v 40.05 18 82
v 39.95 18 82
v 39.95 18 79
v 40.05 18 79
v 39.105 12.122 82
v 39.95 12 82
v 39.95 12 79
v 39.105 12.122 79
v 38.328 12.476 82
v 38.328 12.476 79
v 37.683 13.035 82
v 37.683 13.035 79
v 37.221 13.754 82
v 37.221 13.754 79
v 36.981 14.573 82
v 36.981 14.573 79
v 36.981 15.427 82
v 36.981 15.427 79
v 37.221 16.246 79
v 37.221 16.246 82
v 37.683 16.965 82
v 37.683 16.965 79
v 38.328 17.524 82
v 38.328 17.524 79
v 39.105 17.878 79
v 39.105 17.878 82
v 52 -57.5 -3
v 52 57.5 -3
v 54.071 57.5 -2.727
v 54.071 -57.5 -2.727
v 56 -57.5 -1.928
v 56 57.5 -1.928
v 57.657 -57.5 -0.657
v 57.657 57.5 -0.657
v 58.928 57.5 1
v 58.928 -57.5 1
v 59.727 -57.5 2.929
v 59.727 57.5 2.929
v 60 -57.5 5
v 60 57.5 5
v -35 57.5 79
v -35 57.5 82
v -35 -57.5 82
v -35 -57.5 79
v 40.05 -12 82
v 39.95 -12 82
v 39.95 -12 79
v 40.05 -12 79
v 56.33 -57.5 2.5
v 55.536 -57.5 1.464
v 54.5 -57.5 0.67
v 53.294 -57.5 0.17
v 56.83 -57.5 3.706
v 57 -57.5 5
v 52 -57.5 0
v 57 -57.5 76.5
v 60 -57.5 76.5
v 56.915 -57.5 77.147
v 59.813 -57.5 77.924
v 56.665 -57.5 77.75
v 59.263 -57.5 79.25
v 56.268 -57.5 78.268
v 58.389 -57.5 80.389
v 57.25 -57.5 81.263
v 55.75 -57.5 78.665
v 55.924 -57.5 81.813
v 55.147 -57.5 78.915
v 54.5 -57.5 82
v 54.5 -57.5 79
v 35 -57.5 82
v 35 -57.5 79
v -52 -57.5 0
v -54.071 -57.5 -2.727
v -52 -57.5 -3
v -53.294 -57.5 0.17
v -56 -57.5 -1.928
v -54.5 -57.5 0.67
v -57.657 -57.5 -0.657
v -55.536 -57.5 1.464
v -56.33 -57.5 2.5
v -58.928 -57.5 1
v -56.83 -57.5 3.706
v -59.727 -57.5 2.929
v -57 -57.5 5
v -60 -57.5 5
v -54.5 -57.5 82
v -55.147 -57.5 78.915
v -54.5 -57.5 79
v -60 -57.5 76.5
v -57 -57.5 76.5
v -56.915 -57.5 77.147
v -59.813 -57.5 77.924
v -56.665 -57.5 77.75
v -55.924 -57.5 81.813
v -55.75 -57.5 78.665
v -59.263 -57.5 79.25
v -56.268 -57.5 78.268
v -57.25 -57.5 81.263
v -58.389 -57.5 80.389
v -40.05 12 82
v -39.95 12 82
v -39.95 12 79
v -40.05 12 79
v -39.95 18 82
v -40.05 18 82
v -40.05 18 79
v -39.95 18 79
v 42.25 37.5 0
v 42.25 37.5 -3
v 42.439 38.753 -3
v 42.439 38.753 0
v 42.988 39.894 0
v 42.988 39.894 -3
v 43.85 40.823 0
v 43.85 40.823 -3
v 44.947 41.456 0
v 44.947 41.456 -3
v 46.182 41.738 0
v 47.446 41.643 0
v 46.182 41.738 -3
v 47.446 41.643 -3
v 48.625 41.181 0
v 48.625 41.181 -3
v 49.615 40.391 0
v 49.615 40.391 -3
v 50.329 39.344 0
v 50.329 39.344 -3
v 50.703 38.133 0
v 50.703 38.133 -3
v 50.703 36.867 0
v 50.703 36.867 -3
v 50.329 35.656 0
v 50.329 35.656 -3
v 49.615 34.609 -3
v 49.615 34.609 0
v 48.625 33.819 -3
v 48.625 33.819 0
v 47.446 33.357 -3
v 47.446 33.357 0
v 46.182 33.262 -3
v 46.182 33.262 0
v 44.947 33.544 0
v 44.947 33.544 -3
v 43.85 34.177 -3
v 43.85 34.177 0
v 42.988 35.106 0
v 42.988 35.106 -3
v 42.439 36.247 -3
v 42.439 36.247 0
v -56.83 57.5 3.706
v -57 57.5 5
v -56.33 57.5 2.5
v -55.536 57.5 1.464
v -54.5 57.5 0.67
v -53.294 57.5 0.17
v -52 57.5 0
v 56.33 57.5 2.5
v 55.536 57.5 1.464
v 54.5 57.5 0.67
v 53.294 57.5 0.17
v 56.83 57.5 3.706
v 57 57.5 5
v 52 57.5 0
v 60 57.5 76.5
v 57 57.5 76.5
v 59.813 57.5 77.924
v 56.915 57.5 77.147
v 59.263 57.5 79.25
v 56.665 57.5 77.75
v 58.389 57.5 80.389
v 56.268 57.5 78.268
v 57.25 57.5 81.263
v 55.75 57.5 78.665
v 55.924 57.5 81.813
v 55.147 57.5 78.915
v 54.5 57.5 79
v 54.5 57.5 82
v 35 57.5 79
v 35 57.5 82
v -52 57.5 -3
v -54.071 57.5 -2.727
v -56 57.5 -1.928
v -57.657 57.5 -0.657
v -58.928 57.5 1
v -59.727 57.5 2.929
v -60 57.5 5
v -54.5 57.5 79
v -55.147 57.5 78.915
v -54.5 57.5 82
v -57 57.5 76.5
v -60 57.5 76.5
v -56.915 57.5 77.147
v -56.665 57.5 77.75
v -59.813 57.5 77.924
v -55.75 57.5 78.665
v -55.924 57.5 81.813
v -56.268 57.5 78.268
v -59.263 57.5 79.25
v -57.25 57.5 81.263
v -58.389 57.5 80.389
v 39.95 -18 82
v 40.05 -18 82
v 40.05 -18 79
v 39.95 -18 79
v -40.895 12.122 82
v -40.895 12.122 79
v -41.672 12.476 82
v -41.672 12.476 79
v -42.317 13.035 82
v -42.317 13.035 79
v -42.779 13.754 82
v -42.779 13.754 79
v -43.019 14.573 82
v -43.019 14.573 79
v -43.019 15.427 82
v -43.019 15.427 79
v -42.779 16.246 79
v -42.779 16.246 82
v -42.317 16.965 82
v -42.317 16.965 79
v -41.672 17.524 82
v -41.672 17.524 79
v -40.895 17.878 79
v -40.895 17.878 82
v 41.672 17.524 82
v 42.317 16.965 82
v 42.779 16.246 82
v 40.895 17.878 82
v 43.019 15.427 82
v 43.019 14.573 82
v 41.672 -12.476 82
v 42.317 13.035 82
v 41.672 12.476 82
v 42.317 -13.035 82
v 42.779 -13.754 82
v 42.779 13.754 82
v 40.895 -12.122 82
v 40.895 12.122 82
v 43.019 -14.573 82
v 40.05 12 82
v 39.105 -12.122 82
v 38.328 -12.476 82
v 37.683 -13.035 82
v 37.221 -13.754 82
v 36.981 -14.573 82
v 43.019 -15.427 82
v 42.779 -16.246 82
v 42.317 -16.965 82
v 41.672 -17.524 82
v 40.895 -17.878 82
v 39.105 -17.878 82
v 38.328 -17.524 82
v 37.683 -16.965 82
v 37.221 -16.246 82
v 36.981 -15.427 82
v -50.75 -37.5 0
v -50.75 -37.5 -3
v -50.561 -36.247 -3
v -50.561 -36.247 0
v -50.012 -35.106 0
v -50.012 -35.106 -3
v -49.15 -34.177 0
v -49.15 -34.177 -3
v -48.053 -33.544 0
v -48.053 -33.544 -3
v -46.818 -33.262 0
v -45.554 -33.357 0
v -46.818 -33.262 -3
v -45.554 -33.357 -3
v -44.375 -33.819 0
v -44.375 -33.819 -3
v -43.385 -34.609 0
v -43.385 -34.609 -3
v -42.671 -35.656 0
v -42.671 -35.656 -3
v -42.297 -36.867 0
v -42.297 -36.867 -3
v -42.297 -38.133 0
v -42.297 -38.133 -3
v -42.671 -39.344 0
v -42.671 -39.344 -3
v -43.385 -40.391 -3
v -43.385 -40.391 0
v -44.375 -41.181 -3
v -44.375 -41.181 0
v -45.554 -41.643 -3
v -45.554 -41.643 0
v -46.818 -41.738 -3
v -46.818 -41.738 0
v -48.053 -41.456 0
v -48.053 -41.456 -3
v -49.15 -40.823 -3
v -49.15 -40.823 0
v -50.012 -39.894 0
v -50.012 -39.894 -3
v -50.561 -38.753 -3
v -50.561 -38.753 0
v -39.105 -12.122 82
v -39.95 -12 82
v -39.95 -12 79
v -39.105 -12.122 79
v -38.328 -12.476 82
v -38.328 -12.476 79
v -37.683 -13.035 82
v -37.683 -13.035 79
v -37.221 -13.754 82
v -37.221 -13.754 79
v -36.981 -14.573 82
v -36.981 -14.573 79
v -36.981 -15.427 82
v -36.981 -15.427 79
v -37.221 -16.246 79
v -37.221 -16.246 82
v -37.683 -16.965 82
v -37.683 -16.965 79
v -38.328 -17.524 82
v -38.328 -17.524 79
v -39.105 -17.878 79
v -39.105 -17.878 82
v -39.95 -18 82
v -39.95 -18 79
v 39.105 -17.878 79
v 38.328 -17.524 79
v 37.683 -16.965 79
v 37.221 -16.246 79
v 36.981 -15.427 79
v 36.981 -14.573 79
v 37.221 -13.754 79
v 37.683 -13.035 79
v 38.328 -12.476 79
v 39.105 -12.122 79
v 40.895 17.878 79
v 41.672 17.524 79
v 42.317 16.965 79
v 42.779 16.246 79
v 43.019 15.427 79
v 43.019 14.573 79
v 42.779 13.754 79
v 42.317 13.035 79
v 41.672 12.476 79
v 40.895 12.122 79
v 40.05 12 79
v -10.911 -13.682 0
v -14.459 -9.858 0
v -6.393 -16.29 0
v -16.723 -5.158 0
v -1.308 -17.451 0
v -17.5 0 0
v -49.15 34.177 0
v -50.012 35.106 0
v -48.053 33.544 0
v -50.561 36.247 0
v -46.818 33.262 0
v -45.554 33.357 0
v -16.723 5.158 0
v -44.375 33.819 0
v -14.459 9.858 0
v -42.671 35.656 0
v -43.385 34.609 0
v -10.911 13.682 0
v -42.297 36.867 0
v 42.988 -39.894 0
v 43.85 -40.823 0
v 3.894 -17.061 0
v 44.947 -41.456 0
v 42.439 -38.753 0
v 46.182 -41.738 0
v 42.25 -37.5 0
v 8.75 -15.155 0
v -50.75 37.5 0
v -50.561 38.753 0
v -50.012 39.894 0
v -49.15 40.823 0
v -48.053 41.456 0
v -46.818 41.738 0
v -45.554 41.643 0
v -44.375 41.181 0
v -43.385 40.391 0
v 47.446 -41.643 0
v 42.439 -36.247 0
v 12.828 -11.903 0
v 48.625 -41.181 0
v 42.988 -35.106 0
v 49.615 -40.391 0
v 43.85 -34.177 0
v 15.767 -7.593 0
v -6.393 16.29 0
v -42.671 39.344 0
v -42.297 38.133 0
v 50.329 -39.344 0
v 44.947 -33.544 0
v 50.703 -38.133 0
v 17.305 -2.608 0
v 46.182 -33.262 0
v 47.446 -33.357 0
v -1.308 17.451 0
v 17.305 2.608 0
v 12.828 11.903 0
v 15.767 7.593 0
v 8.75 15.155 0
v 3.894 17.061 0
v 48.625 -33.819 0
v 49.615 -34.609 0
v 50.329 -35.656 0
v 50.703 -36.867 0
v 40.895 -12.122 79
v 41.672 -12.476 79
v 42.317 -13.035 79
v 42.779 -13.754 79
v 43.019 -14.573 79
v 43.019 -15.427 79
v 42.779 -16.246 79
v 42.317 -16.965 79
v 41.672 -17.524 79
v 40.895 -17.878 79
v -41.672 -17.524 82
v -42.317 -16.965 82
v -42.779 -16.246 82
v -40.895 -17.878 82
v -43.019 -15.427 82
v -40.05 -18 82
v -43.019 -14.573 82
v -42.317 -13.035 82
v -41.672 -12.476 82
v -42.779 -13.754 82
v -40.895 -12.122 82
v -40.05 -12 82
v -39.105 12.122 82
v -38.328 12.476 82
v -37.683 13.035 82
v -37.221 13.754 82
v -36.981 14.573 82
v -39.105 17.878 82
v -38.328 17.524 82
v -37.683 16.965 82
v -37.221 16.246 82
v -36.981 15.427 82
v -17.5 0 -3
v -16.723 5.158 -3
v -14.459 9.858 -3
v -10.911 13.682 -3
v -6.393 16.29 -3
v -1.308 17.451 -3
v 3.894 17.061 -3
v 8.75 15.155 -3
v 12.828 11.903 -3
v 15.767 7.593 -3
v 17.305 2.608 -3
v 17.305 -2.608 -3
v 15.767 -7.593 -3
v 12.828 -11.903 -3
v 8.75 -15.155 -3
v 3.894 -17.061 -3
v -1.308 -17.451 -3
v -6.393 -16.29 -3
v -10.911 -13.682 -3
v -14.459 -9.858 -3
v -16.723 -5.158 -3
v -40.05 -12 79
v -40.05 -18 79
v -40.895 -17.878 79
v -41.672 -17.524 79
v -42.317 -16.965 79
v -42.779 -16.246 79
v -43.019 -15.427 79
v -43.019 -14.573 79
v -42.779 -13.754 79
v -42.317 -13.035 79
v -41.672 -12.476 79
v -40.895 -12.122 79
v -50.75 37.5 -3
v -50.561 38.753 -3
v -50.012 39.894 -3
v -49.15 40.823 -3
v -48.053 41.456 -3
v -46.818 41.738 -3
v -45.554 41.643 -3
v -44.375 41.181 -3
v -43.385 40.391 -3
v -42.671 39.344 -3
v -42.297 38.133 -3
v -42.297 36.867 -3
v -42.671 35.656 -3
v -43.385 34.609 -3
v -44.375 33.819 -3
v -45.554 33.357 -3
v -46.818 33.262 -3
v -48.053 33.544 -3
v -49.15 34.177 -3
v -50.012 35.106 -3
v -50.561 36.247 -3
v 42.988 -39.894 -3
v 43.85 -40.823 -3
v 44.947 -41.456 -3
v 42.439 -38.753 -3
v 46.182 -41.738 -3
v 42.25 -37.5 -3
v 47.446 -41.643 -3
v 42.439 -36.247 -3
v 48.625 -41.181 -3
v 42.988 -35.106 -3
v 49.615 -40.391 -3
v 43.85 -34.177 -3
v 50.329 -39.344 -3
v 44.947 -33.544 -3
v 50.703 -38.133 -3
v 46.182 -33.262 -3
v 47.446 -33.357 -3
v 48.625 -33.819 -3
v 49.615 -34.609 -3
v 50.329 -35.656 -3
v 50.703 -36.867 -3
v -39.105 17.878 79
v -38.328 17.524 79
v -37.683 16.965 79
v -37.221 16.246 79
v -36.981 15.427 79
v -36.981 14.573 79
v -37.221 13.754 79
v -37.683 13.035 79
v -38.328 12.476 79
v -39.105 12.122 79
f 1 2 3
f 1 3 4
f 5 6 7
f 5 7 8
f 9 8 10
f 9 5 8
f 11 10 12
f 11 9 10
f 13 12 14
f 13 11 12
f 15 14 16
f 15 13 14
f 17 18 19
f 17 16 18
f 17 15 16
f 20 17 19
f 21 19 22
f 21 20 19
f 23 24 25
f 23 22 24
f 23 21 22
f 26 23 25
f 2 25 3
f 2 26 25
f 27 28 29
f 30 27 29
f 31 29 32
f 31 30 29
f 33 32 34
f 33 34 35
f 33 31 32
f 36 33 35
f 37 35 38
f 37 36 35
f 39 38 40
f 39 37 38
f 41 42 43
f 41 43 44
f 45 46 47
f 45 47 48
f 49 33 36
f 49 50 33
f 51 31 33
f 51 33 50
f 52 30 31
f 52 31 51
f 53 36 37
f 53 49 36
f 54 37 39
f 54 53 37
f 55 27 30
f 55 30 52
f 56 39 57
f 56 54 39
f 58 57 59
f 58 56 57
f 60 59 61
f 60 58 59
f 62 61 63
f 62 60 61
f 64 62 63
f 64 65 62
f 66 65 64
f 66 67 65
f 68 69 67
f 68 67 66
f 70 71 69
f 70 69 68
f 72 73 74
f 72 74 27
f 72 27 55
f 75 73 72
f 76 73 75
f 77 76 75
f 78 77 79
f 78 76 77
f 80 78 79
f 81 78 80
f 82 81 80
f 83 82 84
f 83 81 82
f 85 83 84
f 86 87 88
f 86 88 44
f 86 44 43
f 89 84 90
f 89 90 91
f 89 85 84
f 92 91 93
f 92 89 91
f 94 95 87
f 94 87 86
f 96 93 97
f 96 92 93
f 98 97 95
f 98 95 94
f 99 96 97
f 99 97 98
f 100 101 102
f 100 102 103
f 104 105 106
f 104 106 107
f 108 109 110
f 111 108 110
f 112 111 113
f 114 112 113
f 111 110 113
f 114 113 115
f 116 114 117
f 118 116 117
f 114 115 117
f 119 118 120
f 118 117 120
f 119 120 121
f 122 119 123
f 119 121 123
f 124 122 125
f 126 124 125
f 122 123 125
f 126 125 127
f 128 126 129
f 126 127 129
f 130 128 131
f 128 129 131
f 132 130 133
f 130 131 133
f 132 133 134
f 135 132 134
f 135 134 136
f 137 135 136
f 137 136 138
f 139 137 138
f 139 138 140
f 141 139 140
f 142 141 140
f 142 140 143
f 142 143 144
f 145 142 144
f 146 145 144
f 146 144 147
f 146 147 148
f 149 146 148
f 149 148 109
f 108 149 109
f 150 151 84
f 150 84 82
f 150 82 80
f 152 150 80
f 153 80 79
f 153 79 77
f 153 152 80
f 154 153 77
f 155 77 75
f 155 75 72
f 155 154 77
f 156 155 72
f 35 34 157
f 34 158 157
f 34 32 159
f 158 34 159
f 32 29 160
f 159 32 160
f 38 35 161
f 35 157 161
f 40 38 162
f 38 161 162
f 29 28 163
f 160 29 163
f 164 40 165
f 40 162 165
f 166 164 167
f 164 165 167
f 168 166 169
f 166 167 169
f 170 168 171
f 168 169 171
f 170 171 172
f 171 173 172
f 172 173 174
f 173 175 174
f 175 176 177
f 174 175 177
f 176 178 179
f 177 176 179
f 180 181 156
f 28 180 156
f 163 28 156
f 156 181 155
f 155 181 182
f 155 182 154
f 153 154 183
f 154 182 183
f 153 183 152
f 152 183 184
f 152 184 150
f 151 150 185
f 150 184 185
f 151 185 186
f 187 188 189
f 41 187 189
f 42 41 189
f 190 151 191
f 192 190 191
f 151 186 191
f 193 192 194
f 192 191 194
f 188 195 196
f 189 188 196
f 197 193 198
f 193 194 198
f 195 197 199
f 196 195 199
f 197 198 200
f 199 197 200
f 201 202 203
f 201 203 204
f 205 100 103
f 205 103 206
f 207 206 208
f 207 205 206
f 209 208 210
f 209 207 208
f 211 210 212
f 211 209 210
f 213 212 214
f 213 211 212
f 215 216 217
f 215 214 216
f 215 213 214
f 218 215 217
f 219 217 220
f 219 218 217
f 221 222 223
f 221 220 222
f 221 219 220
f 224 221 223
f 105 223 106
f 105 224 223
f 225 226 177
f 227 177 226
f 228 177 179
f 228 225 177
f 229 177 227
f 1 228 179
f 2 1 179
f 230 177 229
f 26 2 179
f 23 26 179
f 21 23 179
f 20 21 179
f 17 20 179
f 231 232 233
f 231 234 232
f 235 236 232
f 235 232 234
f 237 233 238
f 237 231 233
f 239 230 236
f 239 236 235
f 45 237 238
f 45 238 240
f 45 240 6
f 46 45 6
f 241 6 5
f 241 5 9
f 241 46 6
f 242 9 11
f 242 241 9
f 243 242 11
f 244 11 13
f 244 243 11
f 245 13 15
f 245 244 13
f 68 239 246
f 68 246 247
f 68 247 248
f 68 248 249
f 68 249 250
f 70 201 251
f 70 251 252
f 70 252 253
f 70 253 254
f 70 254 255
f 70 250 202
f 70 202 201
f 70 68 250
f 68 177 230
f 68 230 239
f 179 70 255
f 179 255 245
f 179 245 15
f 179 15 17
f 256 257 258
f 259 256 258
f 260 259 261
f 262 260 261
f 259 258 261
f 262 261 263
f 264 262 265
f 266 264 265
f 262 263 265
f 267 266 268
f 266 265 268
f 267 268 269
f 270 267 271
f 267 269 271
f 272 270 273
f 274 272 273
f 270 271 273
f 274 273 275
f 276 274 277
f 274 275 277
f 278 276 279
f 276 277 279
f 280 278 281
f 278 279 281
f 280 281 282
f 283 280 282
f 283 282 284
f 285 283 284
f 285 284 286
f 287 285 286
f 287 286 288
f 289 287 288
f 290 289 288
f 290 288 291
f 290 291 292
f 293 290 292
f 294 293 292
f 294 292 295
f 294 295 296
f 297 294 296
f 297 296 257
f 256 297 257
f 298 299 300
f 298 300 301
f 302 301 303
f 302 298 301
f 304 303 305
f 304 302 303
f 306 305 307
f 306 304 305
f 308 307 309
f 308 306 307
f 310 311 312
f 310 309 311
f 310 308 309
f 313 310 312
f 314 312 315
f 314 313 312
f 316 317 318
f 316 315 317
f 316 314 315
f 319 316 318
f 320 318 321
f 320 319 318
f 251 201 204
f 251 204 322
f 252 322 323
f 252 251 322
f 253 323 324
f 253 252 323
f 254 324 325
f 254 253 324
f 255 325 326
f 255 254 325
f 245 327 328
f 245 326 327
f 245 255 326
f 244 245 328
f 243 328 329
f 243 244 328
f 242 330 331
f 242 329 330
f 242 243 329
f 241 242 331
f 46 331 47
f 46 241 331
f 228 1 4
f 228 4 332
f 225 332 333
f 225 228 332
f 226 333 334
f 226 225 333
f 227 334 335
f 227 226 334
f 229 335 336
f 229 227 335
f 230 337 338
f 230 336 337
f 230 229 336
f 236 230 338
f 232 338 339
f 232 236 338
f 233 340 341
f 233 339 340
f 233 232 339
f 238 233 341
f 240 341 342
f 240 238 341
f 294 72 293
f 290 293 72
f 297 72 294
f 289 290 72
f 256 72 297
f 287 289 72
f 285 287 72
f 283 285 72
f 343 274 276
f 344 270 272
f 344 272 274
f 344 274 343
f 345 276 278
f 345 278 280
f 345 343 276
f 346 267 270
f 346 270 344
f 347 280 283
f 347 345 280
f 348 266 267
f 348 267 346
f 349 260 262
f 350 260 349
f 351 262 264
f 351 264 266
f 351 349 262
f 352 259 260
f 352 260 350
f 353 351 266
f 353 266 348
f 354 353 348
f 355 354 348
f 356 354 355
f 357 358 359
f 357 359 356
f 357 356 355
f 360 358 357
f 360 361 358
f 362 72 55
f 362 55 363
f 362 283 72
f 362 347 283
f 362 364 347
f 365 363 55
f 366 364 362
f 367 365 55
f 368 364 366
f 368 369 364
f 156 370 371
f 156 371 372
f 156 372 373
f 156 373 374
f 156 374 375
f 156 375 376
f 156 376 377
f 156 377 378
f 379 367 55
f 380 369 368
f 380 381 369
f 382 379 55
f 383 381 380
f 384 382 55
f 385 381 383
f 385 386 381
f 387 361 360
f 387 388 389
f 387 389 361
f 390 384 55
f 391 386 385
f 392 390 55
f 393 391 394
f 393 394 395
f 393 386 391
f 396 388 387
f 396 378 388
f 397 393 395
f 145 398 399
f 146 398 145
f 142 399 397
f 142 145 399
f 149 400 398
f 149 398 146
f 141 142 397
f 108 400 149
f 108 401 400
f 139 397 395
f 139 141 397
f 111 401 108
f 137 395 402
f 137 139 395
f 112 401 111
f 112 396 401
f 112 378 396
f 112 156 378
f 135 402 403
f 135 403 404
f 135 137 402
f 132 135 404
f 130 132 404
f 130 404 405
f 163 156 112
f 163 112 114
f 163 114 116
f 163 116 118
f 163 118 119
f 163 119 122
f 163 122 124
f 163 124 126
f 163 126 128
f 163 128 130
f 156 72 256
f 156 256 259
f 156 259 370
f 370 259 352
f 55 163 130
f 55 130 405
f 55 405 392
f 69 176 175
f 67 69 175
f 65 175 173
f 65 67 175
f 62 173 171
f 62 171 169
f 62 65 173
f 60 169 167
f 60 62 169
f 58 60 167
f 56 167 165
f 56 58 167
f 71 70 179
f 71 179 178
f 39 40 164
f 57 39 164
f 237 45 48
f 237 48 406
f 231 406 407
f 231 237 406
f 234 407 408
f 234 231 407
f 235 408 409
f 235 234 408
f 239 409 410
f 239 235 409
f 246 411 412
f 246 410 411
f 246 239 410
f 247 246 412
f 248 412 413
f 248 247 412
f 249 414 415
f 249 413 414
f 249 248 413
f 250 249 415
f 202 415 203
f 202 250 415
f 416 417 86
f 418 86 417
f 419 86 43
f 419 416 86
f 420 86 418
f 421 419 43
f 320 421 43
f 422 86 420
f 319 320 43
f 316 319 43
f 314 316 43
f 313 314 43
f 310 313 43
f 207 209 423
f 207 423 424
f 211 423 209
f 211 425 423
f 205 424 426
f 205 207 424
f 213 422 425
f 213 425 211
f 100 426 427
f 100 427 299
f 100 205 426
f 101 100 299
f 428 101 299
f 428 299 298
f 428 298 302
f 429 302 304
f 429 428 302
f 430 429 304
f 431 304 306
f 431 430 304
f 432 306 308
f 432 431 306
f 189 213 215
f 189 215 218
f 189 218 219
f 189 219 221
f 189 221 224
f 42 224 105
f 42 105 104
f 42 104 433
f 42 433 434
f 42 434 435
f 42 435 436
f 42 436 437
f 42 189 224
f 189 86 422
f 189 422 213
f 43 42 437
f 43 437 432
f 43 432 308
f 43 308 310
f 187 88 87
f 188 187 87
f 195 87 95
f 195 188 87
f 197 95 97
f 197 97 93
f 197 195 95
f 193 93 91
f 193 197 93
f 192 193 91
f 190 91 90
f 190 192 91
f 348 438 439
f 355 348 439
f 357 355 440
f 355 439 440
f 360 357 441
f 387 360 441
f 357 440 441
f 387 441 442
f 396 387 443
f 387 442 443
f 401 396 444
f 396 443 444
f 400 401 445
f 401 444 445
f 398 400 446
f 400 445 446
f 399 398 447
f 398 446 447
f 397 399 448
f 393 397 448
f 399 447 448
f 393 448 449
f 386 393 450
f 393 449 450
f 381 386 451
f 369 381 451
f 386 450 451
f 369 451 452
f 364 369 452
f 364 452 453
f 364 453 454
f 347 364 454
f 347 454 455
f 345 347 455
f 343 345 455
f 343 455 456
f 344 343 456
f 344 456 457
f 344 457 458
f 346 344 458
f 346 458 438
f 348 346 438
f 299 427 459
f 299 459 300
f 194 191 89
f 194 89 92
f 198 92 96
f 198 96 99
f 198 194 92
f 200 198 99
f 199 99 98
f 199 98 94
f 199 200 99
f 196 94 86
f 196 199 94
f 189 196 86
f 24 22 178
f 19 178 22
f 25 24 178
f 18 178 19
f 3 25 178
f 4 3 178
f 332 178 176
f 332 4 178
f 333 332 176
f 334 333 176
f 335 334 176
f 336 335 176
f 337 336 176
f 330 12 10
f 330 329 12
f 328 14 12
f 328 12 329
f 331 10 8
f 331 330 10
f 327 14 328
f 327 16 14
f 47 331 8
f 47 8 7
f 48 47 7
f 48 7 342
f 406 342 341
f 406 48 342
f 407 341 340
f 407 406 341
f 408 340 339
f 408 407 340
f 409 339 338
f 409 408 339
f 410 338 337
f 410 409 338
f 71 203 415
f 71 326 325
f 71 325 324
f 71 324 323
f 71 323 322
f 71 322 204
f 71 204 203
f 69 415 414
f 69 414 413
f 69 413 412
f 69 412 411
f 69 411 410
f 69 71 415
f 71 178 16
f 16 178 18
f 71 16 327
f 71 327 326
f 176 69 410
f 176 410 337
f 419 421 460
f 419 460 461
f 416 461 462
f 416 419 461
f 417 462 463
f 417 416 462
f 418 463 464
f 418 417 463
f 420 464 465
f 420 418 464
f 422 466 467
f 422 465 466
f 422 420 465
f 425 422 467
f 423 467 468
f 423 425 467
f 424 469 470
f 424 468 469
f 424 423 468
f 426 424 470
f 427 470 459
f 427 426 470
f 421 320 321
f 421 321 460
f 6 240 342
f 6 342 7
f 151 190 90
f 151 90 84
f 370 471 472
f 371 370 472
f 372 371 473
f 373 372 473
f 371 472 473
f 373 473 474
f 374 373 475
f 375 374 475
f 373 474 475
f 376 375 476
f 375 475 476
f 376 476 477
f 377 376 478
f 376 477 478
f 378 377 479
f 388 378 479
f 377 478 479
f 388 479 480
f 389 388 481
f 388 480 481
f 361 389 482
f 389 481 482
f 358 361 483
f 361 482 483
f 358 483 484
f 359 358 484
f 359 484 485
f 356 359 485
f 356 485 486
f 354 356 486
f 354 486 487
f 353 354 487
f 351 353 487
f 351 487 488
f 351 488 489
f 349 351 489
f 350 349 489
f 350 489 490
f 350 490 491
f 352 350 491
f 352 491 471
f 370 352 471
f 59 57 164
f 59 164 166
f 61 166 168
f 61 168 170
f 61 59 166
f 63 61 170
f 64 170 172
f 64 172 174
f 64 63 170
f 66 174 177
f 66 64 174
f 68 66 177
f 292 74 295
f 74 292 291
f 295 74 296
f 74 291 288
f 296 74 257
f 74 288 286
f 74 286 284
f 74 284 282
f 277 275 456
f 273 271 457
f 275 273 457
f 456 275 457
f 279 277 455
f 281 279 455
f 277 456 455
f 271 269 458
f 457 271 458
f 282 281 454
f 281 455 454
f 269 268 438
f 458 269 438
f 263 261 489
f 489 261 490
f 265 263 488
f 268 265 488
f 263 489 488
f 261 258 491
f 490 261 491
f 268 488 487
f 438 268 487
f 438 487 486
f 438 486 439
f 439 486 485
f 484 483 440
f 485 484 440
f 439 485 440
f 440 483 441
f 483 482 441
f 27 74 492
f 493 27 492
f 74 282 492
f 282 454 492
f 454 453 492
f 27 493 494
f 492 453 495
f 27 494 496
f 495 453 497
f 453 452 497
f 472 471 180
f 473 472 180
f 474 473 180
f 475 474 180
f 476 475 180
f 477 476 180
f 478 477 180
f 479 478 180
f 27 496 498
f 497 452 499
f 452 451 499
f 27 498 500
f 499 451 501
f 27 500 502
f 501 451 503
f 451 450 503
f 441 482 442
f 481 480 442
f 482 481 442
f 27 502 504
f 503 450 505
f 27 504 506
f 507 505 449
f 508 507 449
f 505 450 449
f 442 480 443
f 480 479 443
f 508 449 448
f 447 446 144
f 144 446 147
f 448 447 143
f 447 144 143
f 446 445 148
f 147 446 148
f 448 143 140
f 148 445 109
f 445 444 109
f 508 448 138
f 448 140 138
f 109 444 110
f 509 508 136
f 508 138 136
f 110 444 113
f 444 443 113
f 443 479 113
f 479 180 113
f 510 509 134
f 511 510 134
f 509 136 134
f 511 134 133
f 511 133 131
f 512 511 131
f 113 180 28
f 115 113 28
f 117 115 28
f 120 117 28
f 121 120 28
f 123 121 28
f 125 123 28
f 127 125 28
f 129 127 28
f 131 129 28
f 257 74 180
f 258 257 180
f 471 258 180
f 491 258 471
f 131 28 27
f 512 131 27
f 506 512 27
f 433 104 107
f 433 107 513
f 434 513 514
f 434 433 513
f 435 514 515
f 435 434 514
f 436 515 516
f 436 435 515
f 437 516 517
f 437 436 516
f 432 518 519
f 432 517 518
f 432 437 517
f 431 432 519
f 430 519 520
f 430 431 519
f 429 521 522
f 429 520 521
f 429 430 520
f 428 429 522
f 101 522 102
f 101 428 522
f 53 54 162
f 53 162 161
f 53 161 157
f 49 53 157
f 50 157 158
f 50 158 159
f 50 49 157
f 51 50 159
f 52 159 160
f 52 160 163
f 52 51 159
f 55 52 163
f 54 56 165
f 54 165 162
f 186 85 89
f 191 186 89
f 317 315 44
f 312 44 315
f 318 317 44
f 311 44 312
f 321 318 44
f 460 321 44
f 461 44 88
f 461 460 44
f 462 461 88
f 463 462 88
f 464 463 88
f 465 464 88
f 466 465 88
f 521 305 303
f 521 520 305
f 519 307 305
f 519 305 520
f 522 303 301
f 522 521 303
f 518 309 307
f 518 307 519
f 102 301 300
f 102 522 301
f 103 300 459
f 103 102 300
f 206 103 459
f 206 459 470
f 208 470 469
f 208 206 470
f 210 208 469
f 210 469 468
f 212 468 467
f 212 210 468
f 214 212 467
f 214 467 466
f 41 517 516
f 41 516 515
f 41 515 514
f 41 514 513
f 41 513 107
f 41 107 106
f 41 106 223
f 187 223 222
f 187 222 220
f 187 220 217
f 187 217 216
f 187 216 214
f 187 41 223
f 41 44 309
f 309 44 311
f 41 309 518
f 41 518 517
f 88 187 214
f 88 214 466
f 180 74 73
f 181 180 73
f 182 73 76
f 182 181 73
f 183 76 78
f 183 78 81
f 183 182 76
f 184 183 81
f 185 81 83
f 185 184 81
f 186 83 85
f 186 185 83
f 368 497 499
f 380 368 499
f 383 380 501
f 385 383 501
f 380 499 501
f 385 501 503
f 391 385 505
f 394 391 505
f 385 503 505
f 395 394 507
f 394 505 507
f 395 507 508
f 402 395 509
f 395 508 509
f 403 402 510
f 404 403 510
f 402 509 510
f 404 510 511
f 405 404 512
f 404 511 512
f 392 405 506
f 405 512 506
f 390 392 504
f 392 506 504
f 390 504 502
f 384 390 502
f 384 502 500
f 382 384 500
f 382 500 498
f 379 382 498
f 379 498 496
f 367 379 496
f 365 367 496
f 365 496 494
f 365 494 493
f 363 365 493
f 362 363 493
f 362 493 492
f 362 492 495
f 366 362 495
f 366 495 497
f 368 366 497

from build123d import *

# Parameters (mm, degrees)
SKETCH1_W                      = 120
SKETCH1_H                      = 115
BASE_FLANGE1_DEPTH             = 3
EDGE_FLANGE1_STRIP_W           = 22
EDGE_FLANGE1_STRIP_H           = 3
EDGE_FLANGE1_STRIP_CUT_DEPTH   = 115
EDGE_FLANGE1_STRIP_2_W         = 22
EDGE_FLANGE1_STRIP_2_H         = 3
EDGE_FLANGE1_STRIP_CUT_2_DEPTH = 115
EDGE_FLANGE1_DEPTH             = 115
EDGE_FLANGE1_BEND_DEPTH        = 115
EDGE_FLANGE2_STRIP_W           = 17
EDGE_FLANGE2_STRIP_H           = 3
EDGE_FLANGE2_STRIP_CUT_DEPTH   = 115
EDGE_FLANGE2_STRIP_2_W         = 17
EDGE_FLANGE2_STRIP_2_H         = 3
EDGE_FLANGE2_STRIP_CUT_2_DEPTH = 115
EDGE_FLANGE2_DEPTH             = 115
EDGE_FLANGE2_BEND_DEPTH        = 115
CUT_EXTRUDE1_DEPTH             = 10
LPATTERN1_COUNT                = 2
LPATTERN1_PITCH                = 30
LPATTERN2_COUNT                = 2
LPATTERN2_PITCH                = 80
LPATTERN2_COPY_1_DEPTH         = 10
SKETCH19_R                     = 4.25
CUT_EXTRUDE2_DEPTH             = 10
LPATTERN3_COUNT                = 2
LPATTERN3_PITCH                = 75
SKETCH20_R                     = 17.5
CUT_EXTRUDE3_DEPTH             = 10


# Sheet-metal steps are written as plain solids
with BuildPart() as part:
    # Sketch1 → Base-Flange1 (new body)
    with BuildSketch(Plane.XY):
        Rectangle(SKETCH1_W, SKETCH1_H)
    extrude(amount=-BASE_FLANGE1_DEPTH)

    # Edge-Flange1 strip (across the edge) → Edge-Flange1 strip cut (cut)
    with BuildSketch(Plane(origin=(60, -57.5, 0), x_dir=(-1, 0, 0), z_dir=(0, 1, 0))):
        with Locations((-3, -1.5)):
            Rectangle(EDGE_FLANGE1_STRIP_W, EDGE_FLANGE1_STRIP_H)
    extrude(amount=EDGE_FLANGE1_STRIP_CUT_DEPTH, mode=Mode.SUBTRACT)

    # Edge-Flange1 strip 2 (across the edge) → Edge-Flange1 strip cut 2 (cut)
    with BuildSketch(Plane(origin=(-60, 57.5, 0), x_dir=(1, 0, 0), z_dir=(0, -1, 0))):
        with Locations((-3, -1.5)):
            Rectangle(EDGE_FLANGE1_STRIP_2_W, EDGE_FLANGE1_STRIP_2_H)
    extrude(amount=EDGE_FLANGE1_STRIP_CUT_2_DEPTH, mode=Mode.SUBTRACT)

    # Edge-Flange1 section (across the edge) → Edge-Flange1 (add)
    with BuildSketch(Plane(origin=(60, -57.5, 0), x_dir=(-1, 0, 0), z_dir=(0, 1, 0))):
        with BuildLine():
            Line((0, 5), (0, 82))
            Line((0, 82), (3, 82))
            Line((3, 82), (3, 5))
            ThreePointArc((3, 5), (4.464466094, 1.464466094), (8, 0))
            Line((8, 0), (8, -3))
            ThreePointArc((8, -3), (2.343145751, -0.656854249), (0, 5))
        make_face()
    extrude(amount=EDGE_FLANGE1_DEPTH)

    # Edge-Flange1 section 2 (across the edge) → Edge-Flange1 bend (add)
    with BuildSketch(Plane(origin=(-60, 57.5, 0), x_dir=(1, 0, 0), z_dir=(0, -1, 0))):
        with BuildLine():
            Line((0, 5), (0, 82))
            Line((0, 82), (3, 82))
            Line((3, 82), (3, 5))
            ThreePointArc((3, 5), (4.464466094, 1.464466094), (8, 0))
            Line((8, 0), (8, -3))
            ThreePointArc((8, -3), (2.343145751, -0.656854249), (0, 5))
        make_face()
    extrude(amount=EDGE_FLANGE1_BEND_DEPTH)

    # Edge-Flange2 strip (across the edge) → Edge-Flange2 strip cut (cut)
    with BuildSketch(Plane(origin=(-57, 57.5, 82), x_dir=(0, 0, -1), z_dir=(0, -1, 0))):
        with Locations((-3, -1.5)):
            Rectangle(EDGE_FLANGE2_STRIP_W, EDGE_FLANGE2_STRIP_H)
    extrude(amount=EDGE_FLANGE2_STRIP_CUT_DEPTH, mode=Mode.SUBTRACT)

    # Edge-Flange2 strip 2 (across the edge) → Edge-Flange2 strip cut 2 (cut)
    with BuildSketch(Plane(origin=(57, -57.5, 82), x_dir=(0, 0, -1), z_dir=(0, 1, 0))):
        with Locations((-3, -1.5)):
            Rectangle(EDGE_FLANGE2_STRIP_2_W, EDGE_FLANGE2_STRIP_2_H)
    extrude(amount=EDGE_FLANGE2_STRIP_CUT_2_DEPTH, mode=Mode.SUBTRACT)

    # Edge-Flange2 section (across the edge) → Edge-Flange2 (add)
    with BuildSketch(Plane(origin=(-57, 57.5, 82), x_dir=(0, 0, -1), z_dir=(0, -1, 0))):
        with BuildLine():
            Line((0, 2.5), (0, 22))
            Line((0, 22), (3, 22))
            Line((3, 22), (3, 2.5))
            ThreePointArc((3, 2.5), (3.732233047, 0.732233047), (5.5, 0))
            Line((5.5, 0), (5.5, -3))
            ThreePointArc((5.5, -3), (1.610912703, -1.389087297), (0, 2.5))
        make_face()
    extrude(amount=EDGE_FLANGE2_DEPTH)

    # Edge-Flange2 section 2 (across the edge) → Edge-Flange2 bend (add)
    with BuildSketch(Plane(origin=(57, -57.5, 82), x_dir=(0, 0, -1), z_dir=(0, 1, 0))):
        with BuildLine():
            Line((0, 2.5), (0, 22))
            Line((0, 22), (3, 22))
            Line((3, 22), (3, 2.5))
            ThreePointArc((3, 2.5), (3.732233047, 0.732233047), (5.5, 0))
            Line((5.5, 0), (5.5, -3))
            ThreePointArc((5.5, -3), (1.610912703, -1.389087297), (0, 2.5))
        make_face()
    extrude(amount=EDGE_FLANGE2_BEND_DEPTH)

    # Sketch18 → Cut-Extrude1 (cut)
    with BuildSketch(Plane.XY.offset(82)):
        with BuildLine():
            Line((-40.05, -12), (-39.95, -12))
            ThreePointArc((-39.95, -12), (-36.95, -15), (-39.95, -18))
            Line((-39.95, -18), (-40.05, -18))
            ThreePointArc((-40.05, -18), (-43.05, -15), (-40.05, -12))
        make_face()
    cut_extrude1 = extrude(amount=-CUT_EXTRUDE1_DEPTH, mode=Mode.SUBTRACT)

    # LPattern1: Cut-Extrude1 ×2
    with Locations(*[(0, i * LPATTERN1_PITCH, 0) for i in range(1, LPATTERN1_COUNT)]):
        add(cut_extrude1, mode=Mode.SUBTRACT)

    # LPattern2: Cut-Extrude1 ×2
    with Locations(*[(i * LPATTERN2_PITCH, 0, 0) for i in range(1, LPATTERN2_COUNT)]):
        add(cut_extrude1, mode=Mode.SUBTRACT)

    # LPattern2 copy 1 sketch → LPattern2 copy 1 (cut)
    with BuildSketch(Plane(origin=(80, 30, 82), x_dir=(1, 0, 0), z_dir=(0, 0, 1))):
        with BuildLine():
            Line((-40.05, -12), (-39.95, -12))
            ThreePointArc((-39.95, -12), (-36.95, -15), (-39.95, -18))
            Line((-39.95, -18), (-40.05, -18))
            ThreePointArc((-40.05, -18), (-43.05, -15), (-40.05, -12))
        make_face()
    extrude(amount=-LPATTERN2_COPY_1_DEPTH, mode=Mode.SUBTRACT)

    # Sketch19 → Cut-Extrude2 (cut)
    with BuildSketch(Plane(origin=(0, 0, -3), x_dir=(-1, 0, 0), z_dir=(0, 0, -1))):
        with Locations((-46.5, -37.5)):
            Circle(SKETCH19_R)
        with Locations((46.5, -37.5)):
            Circle(SKETCH19_R)
    cut_extrude2 = extrude(amount=-CUT_EXTRUDE2_DEPTH, mode=Mode.SUBTRACT)

    # LPattern3: Cut-Extrude2 ×2
    with Locations(*[(0, i * LPATTERN3_PITCH, 0) for i in range(1, LPATTERN3_COUNT)]):
        add(cut_extrude2, mode=Mode.SUBTRACT)

    # Sketch20 → Cut-Extrude3 (cut)
    with BuildSketch(Plane(origin=(0, 0, -3), x_dir=(-1, 0, 0), z_dir=(0, 0, -1))):
        Circle(SKETCH20_R)
    extrude(amount=-CUT_EXTRUDE3_DEPTH, mode=Mode.SUBTRACT)


solid = part.part
